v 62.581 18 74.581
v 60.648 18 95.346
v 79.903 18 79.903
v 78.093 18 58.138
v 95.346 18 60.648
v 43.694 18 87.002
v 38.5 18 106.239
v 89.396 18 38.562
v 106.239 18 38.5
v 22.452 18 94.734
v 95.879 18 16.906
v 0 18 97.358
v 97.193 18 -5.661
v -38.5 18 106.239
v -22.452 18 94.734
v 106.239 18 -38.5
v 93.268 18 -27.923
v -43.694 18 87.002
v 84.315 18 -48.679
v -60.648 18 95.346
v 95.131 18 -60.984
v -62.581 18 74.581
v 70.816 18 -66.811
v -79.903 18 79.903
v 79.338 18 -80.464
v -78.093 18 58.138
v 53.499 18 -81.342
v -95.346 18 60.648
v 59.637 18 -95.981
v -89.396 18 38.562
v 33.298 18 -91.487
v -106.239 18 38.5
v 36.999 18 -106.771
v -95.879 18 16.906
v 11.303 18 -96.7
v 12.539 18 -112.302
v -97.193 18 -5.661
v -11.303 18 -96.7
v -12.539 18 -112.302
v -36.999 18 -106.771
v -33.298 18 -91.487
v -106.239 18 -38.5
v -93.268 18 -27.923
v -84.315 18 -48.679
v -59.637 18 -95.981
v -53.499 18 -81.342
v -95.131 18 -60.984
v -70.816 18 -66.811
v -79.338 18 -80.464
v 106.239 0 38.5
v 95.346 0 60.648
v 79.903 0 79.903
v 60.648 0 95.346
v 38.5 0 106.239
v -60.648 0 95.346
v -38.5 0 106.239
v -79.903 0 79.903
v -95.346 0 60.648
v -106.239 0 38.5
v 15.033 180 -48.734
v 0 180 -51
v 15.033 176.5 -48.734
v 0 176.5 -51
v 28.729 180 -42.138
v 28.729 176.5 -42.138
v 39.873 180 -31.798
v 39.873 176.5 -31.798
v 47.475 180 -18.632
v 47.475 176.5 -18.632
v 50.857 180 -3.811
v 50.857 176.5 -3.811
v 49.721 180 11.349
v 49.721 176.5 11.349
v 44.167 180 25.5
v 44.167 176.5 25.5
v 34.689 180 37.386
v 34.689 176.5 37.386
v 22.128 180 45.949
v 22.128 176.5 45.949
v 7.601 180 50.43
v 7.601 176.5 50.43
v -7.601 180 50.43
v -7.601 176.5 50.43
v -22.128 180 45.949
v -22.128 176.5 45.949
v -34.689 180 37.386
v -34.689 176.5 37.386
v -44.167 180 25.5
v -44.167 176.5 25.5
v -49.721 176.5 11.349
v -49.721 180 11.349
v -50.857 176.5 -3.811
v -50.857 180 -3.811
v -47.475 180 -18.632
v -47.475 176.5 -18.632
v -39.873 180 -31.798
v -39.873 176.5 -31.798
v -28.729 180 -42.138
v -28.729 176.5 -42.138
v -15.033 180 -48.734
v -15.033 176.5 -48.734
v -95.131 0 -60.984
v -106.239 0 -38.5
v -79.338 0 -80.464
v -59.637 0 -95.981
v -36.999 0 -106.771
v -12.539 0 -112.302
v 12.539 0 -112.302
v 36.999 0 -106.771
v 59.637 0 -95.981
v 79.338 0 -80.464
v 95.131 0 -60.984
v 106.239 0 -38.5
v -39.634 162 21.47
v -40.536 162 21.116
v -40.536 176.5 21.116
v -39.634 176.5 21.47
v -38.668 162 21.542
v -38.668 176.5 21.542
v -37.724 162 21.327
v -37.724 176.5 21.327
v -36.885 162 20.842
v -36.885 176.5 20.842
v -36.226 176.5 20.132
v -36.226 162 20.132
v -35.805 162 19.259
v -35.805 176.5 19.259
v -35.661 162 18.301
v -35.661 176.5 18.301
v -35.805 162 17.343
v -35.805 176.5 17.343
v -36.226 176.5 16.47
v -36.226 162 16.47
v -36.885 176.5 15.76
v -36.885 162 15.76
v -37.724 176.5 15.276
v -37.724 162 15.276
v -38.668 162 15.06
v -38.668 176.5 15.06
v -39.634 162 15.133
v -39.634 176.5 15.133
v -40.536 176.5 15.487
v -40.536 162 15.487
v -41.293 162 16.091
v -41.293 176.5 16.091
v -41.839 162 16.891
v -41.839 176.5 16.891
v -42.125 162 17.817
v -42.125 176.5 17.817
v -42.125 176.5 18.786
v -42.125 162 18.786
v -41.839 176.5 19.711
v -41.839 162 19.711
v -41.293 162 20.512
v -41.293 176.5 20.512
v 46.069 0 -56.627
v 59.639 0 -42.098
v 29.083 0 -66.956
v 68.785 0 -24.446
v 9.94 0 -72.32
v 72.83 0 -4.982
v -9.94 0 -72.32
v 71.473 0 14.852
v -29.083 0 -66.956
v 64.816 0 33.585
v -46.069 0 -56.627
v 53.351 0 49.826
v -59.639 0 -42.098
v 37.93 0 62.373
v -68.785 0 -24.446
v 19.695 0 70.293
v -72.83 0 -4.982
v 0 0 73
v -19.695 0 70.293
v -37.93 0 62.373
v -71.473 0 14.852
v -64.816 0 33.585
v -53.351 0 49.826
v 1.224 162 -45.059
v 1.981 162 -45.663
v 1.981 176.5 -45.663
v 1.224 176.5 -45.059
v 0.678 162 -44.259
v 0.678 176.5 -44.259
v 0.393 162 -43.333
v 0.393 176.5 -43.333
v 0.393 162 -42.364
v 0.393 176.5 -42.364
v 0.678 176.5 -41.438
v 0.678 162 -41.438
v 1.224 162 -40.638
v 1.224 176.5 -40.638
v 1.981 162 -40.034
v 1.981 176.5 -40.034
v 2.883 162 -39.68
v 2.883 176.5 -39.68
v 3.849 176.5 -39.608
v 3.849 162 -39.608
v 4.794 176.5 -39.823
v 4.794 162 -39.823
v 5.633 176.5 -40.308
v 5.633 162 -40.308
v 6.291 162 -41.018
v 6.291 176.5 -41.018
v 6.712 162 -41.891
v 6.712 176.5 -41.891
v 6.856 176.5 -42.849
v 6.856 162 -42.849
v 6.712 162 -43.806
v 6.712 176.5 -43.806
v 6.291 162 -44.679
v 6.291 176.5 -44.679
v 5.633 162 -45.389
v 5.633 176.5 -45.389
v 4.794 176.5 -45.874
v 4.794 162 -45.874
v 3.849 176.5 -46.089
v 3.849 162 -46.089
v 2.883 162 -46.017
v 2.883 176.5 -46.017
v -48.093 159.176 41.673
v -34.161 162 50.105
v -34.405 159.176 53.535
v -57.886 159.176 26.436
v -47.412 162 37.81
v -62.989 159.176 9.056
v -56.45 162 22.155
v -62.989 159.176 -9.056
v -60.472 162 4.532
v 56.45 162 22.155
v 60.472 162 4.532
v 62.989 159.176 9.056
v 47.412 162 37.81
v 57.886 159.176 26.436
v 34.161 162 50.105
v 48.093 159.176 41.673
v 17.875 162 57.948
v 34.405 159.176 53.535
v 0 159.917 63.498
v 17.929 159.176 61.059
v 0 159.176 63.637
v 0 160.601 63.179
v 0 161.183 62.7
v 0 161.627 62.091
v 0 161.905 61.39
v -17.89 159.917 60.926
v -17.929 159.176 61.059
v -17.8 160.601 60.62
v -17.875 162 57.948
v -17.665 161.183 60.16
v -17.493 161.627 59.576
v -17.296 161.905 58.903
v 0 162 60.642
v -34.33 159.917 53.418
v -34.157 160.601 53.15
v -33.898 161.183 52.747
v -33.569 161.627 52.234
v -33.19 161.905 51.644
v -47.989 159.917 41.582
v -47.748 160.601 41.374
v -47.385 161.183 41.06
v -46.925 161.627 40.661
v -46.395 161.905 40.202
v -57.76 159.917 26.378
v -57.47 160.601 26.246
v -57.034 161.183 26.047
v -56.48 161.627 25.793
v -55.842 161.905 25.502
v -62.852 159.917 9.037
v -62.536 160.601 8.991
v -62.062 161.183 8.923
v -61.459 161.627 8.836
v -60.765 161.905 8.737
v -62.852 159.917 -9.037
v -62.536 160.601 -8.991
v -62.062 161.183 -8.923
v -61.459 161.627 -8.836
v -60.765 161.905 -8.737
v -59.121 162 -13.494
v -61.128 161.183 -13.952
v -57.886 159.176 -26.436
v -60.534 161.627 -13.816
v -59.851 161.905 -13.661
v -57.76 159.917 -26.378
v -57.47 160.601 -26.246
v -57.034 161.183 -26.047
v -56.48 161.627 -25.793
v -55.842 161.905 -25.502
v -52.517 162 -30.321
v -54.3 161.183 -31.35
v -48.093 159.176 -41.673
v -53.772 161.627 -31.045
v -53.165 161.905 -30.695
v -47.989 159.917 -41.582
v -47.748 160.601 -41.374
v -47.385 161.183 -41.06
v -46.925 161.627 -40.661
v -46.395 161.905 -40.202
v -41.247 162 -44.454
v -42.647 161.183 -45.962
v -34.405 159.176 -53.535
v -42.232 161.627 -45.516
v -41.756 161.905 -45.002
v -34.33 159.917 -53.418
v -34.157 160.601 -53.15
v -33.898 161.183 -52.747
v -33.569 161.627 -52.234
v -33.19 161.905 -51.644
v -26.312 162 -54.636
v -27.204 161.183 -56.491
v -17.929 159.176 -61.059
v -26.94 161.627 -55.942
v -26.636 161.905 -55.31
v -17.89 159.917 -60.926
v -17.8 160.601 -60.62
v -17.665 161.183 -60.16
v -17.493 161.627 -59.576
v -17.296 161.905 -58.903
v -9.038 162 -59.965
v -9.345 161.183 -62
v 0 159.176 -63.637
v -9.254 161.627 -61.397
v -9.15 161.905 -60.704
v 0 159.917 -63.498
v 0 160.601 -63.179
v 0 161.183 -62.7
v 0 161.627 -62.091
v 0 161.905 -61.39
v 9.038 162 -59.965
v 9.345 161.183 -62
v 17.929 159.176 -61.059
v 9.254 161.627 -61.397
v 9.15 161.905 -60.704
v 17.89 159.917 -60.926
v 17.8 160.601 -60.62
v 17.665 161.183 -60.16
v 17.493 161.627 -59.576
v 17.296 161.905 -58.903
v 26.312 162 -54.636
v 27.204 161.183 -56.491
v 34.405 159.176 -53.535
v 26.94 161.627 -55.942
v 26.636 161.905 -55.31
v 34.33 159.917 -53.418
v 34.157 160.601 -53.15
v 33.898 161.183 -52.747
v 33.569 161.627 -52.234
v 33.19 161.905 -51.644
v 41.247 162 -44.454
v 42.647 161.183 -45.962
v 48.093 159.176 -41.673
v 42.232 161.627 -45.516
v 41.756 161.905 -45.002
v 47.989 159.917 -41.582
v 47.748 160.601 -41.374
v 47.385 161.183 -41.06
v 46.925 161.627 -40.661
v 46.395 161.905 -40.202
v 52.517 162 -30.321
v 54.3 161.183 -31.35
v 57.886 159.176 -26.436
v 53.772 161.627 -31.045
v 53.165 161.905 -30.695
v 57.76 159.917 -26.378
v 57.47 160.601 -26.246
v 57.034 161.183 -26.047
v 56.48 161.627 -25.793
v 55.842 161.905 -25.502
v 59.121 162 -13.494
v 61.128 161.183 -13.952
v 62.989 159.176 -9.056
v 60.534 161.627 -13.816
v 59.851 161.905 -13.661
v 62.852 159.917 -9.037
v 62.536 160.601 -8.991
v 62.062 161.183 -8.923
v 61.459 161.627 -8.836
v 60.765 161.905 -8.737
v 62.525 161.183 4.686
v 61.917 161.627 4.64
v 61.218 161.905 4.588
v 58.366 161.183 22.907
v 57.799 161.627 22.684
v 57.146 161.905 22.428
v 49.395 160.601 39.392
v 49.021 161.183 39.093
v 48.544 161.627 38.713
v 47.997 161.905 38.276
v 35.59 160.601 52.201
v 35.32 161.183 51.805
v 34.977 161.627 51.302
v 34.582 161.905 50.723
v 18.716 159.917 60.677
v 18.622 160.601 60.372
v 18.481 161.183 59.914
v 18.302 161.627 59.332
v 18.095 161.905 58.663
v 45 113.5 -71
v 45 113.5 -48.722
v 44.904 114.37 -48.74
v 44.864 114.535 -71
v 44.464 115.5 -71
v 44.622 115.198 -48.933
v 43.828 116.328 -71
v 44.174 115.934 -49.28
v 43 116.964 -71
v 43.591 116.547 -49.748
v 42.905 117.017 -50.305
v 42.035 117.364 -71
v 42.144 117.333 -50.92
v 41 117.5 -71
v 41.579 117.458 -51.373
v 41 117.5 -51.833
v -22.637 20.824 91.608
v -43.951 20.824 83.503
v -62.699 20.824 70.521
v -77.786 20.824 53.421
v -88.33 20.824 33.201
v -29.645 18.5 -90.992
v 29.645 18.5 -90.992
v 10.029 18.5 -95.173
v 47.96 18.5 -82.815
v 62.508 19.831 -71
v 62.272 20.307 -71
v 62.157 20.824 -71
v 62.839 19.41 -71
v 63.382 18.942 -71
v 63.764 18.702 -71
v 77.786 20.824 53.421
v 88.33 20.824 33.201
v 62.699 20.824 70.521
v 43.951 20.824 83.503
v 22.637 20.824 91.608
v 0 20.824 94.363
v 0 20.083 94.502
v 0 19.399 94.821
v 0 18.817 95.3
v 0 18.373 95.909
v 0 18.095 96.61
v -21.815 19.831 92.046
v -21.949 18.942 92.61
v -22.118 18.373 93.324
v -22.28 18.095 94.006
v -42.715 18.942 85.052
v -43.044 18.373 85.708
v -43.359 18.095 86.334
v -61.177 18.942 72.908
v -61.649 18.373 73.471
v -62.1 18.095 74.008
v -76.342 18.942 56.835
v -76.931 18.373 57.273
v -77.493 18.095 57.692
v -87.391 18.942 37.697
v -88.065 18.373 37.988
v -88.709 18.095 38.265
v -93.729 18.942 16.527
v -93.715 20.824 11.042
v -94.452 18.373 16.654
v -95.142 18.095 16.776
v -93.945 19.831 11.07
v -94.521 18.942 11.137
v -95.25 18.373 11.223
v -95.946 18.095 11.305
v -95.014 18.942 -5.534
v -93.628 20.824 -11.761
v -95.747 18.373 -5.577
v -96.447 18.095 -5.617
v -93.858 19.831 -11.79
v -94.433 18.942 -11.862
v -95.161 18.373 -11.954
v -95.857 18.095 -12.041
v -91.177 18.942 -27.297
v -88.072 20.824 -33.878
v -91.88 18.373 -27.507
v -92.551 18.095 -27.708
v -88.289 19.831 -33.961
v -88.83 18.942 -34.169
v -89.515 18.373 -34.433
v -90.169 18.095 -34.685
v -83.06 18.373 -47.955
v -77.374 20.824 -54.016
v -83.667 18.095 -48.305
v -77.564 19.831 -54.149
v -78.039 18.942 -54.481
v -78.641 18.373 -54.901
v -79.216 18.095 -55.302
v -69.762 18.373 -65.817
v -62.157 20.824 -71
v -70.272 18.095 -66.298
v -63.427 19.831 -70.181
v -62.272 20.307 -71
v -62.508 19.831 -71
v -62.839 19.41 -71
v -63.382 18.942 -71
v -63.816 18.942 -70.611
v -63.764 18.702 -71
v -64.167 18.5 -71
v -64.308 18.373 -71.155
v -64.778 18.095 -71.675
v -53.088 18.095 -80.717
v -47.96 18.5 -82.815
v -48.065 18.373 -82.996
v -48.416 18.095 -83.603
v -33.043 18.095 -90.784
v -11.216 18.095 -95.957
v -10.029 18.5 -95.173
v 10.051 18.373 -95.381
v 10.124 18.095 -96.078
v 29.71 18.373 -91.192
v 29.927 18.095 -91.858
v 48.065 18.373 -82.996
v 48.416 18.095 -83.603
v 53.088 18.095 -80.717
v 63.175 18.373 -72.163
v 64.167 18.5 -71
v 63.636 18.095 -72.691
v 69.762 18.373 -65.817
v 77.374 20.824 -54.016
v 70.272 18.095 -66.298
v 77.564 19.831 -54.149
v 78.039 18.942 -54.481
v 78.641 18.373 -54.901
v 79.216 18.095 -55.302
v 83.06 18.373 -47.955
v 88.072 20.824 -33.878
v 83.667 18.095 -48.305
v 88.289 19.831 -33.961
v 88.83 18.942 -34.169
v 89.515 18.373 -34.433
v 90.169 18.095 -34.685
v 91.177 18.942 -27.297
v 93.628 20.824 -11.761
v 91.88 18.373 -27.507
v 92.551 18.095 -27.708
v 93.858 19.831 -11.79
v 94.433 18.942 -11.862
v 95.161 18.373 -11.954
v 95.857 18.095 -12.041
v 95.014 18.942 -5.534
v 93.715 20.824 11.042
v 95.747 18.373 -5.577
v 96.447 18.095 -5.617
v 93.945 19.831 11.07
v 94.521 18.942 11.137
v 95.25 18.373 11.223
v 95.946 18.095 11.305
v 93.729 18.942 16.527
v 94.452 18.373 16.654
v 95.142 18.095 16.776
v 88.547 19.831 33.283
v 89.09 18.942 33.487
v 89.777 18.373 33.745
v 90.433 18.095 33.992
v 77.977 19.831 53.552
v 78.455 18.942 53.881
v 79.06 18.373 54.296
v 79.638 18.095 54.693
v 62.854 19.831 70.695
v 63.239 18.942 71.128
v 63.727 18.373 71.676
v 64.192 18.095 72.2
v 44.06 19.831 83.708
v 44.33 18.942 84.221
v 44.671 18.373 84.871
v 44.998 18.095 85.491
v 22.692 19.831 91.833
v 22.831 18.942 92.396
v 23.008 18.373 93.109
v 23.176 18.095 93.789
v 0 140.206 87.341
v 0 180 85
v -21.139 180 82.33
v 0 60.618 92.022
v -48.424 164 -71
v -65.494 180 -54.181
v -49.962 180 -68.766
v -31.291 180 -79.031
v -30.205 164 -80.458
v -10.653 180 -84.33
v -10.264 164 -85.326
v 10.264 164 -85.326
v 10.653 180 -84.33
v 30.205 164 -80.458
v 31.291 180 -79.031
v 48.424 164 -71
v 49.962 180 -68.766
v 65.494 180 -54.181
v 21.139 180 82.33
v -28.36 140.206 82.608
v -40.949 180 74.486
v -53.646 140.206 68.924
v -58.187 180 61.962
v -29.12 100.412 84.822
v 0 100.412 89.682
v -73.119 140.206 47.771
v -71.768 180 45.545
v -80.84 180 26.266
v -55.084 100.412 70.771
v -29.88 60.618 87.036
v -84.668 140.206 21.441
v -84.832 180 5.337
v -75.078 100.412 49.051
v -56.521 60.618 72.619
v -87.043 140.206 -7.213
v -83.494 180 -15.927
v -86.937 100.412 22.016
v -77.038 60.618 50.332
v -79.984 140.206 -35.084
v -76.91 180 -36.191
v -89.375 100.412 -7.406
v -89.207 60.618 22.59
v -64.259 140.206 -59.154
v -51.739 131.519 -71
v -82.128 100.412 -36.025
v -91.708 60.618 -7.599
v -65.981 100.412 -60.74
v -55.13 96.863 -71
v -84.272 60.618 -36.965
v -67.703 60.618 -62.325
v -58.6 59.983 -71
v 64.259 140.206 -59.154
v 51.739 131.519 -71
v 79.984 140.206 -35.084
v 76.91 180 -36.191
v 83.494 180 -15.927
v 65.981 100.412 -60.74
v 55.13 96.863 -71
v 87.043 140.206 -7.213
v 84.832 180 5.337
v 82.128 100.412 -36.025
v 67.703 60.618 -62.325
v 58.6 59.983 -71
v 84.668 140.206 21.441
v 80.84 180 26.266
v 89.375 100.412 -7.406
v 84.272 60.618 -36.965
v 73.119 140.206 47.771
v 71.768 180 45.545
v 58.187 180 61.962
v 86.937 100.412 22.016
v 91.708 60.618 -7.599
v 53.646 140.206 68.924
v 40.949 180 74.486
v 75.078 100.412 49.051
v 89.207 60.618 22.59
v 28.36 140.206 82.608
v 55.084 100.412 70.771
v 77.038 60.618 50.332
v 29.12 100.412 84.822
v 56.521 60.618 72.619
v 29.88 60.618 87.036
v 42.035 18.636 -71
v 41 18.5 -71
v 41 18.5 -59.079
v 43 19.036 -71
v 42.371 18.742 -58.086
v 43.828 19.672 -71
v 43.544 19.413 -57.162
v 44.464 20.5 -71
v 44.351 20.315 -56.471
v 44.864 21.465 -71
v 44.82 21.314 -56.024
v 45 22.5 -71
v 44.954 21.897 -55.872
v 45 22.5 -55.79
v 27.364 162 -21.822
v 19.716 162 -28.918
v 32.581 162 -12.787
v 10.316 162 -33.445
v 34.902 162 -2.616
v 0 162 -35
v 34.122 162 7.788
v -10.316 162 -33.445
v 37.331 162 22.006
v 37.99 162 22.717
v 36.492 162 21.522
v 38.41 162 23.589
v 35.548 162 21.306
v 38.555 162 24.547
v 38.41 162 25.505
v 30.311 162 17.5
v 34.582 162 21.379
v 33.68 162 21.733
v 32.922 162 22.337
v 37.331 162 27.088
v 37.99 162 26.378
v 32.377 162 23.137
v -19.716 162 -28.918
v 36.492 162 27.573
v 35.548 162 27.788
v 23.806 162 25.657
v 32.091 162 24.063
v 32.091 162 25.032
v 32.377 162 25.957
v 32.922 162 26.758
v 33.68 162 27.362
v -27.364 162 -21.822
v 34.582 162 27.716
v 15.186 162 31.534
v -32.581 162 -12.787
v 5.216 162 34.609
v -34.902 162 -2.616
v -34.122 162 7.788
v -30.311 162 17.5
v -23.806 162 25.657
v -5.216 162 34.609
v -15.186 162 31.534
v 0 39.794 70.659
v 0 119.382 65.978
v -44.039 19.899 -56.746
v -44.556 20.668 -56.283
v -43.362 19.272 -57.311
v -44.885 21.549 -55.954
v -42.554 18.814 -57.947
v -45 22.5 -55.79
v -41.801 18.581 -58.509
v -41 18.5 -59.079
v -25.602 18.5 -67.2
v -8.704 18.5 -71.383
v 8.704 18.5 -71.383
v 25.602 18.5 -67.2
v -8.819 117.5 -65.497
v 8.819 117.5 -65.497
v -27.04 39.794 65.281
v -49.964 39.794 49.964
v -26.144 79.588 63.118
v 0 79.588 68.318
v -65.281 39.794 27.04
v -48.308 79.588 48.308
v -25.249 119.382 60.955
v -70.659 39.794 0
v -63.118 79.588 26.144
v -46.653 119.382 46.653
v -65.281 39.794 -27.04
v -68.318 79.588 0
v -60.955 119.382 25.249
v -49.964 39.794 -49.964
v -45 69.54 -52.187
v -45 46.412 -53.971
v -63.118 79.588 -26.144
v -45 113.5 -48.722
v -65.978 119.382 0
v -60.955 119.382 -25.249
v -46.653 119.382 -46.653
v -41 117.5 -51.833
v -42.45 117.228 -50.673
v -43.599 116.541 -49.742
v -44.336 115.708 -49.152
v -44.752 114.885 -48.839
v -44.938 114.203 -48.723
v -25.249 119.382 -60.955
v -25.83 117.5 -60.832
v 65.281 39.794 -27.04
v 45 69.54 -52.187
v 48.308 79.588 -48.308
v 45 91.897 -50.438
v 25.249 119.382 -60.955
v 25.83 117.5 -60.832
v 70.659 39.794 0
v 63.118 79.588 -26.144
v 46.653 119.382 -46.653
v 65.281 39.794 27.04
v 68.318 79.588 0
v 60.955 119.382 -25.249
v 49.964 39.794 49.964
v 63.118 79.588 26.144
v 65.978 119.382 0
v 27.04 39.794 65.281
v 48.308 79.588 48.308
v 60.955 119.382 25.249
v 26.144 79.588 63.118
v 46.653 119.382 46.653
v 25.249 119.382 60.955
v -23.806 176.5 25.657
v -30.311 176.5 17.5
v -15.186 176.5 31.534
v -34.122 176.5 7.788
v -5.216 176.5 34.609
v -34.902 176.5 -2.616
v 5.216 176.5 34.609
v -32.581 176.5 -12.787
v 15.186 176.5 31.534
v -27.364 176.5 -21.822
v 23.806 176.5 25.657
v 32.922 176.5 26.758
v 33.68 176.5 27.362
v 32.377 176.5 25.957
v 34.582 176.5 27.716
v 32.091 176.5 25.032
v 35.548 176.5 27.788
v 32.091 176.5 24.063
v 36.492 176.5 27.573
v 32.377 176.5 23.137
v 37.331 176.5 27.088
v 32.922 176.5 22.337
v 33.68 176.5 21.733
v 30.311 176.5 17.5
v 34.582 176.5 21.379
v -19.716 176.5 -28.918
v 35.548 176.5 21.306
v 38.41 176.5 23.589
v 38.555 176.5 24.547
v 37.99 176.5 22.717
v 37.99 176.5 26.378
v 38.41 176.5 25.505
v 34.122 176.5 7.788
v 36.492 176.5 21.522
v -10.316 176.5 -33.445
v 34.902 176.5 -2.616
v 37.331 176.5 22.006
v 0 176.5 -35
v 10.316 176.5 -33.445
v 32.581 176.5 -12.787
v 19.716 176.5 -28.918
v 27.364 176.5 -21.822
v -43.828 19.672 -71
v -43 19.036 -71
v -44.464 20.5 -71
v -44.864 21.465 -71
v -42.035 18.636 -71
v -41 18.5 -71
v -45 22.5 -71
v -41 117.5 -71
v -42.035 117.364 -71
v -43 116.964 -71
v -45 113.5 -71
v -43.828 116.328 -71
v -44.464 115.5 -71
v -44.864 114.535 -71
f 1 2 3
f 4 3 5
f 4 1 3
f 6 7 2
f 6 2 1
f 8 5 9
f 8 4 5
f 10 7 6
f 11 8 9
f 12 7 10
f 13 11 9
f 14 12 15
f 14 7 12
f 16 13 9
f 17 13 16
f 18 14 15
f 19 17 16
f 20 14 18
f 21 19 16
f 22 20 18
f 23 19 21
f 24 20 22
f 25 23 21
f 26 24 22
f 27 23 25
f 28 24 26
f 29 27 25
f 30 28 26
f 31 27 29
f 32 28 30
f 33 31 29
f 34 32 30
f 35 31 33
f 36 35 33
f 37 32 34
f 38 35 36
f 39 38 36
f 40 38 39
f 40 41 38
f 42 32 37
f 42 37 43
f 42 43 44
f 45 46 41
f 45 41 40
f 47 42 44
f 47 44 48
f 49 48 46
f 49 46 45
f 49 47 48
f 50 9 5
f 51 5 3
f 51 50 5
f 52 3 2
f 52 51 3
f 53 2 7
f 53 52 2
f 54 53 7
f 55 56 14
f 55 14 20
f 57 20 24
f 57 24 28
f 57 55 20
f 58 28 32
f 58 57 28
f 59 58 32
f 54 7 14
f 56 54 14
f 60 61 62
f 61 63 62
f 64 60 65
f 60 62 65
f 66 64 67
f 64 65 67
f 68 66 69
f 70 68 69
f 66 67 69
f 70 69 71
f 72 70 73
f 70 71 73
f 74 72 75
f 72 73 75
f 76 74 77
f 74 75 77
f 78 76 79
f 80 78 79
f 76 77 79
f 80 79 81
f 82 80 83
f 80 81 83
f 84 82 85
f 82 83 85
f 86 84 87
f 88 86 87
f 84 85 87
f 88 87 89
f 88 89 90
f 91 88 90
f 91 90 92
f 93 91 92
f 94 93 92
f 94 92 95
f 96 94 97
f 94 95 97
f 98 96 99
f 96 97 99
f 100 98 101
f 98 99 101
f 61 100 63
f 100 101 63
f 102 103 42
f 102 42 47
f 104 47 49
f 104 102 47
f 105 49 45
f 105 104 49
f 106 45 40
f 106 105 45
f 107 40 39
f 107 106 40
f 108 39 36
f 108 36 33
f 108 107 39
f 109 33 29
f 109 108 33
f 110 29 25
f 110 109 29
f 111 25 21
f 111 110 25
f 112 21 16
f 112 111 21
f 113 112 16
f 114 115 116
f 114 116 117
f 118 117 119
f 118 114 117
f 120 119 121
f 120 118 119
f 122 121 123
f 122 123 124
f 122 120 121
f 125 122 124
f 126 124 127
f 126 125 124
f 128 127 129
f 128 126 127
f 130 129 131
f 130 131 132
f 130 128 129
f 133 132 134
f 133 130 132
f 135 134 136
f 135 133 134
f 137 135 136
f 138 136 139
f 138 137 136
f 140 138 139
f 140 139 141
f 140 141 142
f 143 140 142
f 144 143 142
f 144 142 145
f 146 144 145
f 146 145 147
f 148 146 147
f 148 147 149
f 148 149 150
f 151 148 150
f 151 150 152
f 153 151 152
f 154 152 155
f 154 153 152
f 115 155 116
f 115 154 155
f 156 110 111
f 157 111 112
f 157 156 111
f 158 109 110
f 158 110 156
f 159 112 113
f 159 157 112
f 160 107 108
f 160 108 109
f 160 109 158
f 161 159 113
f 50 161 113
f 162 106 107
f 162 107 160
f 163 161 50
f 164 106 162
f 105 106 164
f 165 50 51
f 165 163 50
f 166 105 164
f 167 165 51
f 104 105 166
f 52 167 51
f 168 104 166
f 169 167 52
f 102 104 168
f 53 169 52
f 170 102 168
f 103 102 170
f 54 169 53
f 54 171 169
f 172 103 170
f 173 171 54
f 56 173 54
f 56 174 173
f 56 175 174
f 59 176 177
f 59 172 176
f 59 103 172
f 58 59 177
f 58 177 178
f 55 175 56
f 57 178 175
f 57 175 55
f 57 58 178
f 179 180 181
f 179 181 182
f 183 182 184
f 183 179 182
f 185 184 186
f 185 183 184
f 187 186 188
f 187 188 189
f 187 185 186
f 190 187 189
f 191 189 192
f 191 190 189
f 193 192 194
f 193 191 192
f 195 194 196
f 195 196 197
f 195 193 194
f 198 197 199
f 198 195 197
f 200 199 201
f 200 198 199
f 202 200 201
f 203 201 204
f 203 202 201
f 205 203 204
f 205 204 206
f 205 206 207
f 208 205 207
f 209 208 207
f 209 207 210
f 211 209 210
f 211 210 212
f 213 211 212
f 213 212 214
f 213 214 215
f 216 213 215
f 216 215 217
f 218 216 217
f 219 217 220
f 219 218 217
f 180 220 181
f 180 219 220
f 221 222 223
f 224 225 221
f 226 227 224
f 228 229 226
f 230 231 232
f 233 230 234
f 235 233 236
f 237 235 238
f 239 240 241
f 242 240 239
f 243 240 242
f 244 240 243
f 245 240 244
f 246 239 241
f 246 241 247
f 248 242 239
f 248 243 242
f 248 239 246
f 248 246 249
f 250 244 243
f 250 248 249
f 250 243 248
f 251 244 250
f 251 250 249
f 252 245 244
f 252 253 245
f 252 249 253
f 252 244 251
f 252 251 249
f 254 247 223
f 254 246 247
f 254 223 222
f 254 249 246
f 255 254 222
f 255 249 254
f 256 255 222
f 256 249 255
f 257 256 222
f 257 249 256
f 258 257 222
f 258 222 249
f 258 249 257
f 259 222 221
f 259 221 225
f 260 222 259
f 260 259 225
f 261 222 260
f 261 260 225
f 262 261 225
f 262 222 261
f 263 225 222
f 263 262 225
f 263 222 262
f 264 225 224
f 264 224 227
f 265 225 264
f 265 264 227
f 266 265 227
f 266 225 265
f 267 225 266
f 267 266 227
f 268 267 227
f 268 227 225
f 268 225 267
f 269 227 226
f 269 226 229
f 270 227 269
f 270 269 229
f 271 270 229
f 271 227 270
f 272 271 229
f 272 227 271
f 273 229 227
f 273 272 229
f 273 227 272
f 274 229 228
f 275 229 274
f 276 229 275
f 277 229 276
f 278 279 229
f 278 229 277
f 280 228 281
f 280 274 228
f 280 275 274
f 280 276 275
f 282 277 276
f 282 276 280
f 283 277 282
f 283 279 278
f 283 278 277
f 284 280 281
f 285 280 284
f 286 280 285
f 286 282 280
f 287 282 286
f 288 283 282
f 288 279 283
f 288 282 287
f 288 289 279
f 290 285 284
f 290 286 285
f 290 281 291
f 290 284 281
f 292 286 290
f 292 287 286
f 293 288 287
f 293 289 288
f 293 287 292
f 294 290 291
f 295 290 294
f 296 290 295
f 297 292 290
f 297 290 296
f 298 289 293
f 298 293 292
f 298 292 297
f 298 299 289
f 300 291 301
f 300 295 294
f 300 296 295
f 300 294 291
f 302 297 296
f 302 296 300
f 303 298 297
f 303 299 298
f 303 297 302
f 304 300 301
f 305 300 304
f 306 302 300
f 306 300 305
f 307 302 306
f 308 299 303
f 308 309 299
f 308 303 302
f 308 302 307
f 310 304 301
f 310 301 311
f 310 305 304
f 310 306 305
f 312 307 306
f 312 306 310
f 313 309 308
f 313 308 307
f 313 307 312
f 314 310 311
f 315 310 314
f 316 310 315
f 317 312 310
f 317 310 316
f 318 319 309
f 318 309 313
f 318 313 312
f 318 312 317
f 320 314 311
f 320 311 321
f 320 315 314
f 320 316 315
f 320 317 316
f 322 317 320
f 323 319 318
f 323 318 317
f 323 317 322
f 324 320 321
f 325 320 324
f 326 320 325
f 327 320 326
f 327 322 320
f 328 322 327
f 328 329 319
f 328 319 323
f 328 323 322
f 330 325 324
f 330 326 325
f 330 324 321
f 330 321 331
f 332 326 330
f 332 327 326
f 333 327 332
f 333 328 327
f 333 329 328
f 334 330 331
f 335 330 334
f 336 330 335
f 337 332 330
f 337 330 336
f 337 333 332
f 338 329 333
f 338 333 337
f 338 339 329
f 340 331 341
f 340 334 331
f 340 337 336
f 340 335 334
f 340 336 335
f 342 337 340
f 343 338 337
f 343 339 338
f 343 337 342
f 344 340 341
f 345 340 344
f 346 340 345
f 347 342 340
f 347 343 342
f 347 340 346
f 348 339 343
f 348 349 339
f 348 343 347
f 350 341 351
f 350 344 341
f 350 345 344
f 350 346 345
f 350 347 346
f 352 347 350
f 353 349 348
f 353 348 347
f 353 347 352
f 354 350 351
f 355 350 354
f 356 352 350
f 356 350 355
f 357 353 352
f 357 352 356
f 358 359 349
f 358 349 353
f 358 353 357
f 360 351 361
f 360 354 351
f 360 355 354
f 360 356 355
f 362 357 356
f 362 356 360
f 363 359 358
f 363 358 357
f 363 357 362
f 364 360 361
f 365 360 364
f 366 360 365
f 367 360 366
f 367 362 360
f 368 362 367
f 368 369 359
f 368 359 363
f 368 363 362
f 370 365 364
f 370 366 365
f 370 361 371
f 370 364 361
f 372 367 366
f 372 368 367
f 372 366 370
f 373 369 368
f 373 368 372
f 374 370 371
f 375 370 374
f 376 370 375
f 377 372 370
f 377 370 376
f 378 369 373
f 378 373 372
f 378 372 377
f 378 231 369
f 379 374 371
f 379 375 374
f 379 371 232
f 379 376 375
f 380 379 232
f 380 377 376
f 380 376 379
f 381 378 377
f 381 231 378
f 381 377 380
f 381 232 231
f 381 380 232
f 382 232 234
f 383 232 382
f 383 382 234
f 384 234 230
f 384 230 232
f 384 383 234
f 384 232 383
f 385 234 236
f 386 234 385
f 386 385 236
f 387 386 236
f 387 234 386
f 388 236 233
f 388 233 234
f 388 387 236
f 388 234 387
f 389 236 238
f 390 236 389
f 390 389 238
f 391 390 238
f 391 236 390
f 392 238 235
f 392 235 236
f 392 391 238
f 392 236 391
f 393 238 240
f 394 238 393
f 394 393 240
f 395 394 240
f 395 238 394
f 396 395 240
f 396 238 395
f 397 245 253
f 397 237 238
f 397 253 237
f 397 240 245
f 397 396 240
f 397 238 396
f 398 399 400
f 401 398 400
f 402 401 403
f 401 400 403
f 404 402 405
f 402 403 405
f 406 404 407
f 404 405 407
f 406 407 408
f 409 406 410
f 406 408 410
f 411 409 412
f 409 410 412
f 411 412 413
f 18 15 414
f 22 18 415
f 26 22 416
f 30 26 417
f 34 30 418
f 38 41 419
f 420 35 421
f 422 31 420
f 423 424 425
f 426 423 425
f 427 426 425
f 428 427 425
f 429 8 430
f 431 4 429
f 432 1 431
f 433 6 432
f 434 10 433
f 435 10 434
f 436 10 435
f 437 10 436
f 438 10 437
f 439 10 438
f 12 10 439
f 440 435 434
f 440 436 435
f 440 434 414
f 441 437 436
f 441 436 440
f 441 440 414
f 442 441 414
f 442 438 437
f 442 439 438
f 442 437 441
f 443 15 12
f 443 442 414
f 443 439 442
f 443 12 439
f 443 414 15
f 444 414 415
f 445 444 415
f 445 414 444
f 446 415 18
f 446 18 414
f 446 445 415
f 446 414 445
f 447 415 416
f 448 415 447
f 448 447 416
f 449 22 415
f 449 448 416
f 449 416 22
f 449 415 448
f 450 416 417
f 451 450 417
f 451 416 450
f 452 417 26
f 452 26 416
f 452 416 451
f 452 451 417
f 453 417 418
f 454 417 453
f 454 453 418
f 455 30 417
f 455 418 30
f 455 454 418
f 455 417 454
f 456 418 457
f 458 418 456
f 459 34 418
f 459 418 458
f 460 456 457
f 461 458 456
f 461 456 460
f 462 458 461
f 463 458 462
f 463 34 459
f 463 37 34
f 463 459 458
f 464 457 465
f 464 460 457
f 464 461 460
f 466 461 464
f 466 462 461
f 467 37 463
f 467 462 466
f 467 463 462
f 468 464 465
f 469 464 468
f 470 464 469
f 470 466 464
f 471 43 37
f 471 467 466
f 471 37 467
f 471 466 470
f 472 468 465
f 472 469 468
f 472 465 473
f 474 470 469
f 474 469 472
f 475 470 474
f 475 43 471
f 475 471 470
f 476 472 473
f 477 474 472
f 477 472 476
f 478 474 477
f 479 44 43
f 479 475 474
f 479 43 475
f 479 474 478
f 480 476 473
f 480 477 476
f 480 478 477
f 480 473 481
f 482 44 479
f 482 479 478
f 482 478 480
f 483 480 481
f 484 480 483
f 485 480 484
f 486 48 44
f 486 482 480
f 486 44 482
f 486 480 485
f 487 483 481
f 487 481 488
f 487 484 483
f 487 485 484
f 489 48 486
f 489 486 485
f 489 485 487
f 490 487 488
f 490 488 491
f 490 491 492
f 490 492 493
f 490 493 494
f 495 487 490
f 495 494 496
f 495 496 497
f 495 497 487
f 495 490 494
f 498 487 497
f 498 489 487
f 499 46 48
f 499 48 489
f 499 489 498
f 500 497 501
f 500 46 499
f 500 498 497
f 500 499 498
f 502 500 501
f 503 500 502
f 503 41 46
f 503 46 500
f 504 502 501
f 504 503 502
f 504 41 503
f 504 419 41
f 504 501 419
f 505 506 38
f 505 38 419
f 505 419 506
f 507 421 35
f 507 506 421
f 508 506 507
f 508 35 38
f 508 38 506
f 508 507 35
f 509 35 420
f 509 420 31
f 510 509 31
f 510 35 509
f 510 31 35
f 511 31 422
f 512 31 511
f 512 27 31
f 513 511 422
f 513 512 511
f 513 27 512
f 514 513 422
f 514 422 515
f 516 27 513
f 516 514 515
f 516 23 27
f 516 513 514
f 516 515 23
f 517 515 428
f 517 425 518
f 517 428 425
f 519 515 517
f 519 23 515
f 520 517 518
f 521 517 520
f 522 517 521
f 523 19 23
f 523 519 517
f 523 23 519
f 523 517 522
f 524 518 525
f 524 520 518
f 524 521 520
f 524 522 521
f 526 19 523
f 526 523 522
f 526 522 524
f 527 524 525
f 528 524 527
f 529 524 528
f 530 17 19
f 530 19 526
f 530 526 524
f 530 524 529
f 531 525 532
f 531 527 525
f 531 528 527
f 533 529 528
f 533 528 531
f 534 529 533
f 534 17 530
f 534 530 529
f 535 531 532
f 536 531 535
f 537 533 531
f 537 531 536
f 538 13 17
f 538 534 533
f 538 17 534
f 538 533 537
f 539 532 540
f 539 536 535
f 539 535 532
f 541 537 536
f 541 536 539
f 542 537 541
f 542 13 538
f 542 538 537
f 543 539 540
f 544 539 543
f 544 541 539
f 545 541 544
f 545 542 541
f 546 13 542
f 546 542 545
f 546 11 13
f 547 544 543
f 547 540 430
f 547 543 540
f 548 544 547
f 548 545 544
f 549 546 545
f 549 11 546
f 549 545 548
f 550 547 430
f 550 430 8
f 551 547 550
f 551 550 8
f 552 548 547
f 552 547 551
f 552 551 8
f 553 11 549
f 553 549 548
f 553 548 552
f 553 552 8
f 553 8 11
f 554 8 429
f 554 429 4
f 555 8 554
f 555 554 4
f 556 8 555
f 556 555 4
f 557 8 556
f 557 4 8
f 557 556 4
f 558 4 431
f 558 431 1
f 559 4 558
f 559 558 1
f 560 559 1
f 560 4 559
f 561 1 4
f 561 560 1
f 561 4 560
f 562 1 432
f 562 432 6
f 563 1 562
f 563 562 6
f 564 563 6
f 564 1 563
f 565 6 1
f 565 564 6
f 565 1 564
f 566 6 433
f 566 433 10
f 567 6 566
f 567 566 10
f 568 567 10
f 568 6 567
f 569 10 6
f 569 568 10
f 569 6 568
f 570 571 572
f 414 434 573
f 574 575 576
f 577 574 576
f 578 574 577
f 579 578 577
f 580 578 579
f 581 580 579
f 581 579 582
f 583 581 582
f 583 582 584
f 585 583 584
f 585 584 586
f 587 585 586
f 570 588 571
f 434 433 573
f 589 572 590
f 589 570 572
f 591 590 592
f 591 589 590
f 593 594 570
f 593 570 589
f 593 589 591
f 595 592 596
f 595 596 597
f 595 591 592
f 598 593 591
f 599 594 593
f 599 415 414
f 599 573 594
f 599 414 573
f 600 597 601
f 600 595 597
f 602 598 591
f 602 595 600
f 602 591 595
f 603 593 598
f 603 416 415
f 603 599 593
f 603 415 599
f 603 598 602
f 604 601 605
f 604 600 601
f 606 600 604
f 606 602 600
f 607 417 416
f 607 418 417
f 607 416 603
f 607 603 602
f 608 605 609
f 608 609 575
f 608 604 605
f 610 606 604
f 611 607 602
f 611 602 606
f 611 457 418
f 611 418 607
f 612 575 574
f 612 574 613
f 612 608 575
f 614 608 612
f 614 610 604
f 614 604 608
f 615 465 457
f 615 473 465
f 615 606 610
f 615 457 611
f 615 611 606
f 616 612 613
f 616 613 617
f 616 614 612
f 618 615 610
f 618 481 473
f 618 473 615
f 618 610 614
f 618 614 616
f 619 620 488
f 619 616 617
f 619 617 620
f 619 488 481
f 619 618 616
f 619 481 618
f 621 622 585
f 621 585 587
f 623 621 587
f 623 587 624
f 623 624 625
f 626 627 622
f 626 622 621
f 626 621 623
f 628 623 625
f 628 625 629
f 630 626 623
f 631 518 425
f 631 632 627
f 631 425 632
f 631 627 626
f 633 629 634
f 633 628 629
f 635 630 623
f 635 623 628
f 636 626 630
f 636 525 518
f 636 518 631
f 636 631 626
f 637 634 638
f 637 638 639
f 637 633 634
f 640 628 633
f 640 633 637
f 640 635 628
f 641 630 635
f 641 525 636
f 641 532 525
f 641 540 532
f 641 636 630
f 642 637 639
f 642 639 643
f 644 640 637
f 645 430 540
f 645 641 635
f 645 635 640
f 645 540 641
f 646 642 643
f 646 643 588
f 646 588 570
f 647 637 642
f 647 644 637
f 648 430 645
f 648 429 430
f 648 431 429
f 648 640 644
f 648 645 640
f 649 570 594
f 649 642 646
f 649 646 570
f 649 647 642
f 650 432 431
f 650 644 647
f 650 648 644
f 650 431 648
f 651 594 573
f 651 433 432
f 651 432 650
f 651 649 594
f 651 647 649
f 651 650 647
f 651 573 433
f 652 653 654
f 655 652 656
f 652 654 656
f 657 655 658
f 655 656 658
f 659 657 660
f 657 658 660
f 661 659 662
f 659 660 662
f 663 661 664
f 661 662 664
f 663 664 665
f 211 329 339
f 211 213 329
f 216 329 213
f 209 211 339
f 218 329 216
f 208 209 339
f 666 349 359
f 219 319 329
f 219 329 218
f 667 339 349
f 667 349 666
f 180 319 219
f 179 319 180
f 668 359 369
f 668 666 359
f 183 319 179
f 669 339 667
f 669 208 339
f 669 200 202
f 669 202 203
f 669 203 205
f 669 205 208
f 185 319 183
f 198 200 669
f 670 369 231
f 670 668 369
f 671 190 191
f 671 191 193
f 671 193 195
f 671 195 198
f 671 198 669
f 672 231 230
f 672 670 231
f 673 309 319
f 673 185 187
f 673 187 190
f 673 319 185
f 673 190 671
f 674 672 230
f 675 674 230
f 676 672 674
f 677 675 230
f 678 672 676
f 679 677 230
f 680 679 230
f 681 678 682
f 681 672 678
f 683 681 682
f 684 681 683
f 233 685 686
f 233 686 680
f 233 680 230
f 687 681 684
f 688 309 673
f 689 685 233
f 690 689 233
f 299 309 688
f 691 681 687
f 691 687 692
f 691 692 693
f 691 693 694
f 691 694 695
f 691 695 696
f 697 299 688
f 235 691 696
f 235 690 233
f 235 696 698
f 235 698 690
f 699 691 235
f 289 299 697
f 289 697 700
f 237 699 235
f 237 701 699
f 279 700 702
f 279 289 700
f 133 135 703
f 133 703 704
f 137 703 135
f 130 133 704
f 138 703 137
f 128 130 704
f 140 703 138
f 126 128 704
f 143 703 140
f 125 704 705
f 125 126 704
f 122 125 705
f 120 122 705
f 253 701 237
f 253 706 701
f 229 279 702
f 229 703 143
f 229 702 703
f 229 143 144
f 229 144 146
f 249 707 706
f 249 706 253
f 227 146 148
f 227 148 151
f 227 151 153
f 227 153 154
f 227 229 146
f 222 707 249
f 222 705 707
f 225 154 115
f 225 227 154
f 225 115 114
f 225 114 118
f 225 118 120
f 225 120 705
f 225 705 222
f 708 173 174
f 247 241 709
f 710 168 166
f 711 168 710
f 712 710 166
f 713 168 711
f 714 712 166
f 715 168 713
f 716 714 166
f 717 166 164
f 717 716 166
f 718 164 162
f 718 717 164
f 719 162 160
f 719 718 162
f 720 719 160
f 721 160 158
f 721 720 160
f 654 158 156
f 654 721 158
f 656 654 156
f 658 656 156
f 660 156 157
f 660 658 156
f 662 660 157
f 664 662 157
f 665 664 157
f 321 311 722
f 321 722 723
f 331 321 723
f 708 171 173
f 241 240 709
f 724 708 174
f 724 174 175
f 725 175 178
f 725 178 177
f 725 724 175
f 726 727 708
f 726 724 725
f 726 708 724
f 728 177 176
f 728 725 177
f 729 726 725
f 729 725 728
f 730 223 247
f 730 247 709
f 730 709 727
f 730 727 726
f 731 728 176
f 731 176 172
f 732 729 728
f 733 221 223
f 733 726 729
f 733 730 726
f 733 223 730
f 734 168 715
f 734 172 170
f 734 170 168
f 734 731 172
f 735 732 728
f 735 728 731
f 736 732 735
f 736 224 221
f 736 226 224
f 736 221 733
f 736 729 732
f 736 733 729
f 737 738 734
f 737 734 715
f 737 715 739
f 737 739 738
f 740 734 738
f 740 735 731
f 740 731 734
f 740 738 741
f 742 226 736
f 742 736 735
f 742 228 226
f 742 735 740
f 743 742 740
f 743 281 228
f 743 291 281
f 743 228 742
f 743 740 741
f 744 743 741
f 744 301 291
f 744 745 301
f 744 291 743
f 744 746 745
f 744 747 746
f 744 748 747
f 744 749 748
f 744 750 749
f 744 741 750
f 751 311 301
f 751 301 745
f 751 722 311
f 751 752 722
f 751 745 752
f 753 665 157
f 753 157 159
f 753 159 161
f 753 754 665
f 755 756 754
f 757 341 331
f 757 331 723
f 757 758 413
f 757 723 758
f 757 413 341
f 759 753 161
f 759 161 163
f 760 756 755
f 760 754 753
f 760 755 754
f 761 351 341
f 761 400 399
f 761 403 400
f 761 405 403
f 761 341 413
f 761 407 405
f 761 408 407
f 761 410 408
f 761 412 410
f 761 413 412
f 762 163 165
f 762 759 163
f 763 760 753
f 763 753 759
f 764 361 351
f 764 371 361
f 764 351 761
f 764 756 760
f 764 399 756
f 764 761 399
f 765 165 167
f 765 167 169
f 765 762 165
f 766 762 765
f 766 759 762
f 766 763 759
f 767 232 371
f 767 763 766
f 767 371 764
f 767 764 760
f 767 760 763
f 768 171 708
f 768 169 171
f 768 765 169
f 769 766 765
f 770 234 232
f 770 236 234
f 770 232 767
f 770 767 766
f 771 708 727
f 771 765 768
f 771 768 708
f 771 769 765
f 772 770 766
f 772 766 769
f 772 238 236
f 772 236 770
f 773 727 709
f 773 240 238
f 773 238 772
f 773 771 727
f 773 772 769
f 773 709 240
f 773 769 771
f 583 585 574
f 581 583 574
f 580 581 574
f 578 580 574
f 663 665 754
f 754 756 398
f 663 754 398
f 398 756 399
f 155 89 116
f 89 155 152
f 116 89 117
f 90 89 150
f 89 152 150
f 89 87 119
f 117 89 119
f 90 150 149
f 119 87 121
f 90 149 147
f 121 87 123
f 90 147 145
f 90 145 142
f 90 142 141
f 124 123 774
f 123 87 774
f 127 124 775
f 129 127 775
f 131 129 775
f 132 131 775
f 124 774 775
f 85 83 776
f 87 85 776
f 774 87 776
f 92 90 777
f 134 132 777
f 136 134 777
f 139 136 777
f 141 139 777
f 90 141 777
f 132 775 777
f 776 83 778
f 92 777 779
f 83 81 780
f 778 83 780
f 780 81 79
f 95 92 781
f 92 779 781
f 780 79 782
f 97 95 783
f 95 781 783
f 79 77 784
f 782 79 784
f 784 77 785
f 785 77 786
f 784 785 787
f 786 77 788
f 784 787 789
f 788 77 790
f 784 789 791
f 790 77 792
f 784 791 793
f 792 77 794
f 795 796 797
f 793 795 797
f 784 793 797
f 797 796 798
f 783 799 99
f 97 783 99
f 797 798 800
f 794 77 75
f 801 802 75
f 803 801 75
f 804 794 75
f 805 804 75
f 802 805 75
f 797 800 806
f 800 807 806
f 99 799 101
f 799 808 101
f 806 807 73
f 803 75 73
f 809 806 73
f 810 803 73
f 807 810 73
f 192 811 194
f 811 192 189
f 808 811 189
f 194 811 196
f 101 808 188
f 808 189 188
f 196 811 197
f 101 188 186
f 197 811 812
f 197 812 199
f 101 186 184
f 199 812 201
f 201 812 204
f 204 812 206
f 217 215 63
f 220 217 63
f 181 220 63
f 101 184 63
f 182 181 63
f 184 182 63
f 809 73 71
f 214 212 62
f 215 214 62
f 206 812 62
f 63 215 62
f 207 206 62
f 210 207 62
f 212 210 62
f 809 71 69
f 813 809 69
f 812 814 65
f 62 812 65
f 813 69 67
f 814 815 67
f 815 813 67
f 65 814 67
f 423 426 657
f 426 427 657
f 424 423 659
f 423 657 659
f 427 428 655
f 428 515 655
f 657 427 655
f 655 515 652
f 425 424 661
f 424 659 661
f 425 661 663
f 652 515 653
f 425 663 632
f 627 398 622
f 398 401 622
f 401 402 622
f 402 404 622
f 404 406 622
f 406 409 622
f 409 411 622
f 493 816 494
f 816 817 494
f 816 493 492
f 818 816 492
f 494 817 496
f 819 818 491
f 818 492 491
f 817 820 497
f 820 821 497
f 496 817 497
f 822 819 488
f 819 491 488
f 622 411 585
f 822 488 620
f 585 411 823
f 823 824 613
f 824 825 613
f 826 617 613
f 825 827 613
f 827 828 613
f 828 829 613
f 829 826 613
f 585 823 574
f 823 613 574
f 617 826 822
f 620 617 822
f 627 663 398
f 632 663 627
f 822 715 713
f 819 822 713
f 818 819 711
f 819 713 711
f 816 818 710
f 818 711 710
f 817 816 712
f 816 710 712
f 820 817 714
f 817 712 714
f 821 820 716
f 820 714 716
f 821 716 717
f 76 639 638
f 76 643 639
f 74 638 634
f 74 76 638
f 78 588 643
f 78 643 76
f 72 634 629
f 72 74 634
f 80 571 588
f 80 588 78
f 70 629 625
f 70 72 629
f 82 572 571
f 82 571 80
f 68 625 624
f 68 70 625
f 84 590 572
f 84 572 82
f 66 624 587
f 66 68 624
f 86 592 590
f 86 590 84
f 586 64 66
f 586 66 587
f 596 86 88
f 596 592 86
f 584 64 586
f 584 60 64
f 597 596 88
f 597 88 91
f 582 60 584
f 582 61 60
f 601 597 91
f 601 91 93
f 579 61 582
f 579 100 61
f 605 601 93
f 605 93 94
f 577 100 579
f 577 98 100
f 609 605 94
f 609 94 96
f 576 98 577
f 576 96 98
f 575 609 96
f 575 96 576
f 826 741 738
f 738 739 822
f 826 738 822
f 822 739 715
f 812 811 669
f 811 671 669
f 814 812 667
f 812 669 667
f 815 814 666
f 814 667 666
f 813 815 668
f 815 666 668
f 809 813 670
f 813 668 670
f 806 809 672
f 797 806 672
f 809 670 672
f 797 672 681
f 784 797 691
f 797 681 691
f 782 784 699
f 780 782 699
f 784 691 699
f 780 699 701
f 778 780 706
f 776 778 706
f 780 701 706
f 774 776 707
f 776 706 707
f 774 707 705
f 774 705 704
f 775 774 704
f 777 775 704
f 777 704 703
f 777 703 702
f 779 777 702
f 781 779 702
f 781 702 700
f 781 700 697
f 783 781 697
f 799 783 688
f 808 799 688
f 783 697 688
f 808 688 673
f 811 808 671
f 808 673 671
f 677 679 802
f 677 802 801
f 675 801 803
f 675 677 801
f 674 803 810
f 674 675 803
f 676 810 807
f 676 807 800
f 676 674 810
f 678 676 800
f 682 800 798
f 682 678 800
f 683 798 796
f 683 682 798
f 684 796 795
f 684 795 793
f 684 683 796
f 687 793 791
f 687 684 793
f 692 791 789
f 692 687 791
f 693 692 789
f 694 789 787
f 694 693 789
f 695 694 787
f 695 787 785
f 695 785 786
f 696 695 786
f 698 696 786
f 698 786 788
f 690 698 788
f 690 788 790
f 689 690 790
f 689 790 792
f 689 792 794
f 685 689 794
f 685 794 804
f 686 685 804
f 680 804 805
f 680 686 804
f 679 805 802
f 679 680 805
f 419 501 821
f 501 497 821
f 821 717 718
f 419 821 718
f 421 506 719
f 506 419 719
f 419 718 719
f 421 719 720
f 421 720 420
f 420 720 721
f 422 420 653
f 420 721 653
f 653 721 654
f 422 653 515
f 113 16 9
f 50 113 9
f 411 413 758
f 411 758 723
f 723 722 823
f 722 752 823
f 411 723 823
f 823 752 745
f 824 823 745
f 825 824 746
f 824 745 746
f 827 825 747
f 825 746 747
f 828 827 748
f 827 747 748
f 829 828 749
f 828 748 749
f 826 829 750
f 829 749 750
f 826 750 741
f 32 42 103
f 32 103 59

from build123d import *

# Parameters (mm, degrees)
CONG_1_R                     = 3
ESQUISSE2_W                  = 28.843575133
ESQUISSE2_H                  = 77
ESQUISSE2_W_2                = 77
ESQUISSE2_H_2                = 28.843575133
ENL_V_MAT_EXTRU_2_DEPTH      = 228.556586369
ENL_V_MAT_EXTRU_3_DEPTH      = 238.604187674
ENL_V_MAT_EXTRU_4_DEPTH      = 238.604187749
ENL_V_MAT_EXTRU_4_DEPTH_BACK = 238.604187749
ESQUISSE10_W                 = 22.430726153
ESQUISSE10_H                 = 145.5
PER_AGE1_START               = 162
PER_AGE1_OUTLINE_R           = 3.25
PER_AGE1_DEPTH               = 14.5
R_P_TITION_CIRCULAIRE1_COUNT = 3


# Read off the part's stored shape, not the designer's step: Perçage1
with BuildPart() as part:
    # Esquisse1 → Révolution1 (revolve)
    with BuildSketch(Plane.XY, mode=Mode.PRIVATE) as r_volution1_sk:
        Polygon((-113, 0), (-73, 0), (-63.470588237, 162), (0, 162), (0, 180), (-85, 180), (-94.529411763, 18), (-113, 18), align=None)
    revolve(r_volution1_sk.sketch.rotate(Axis((0, 193.73208918, 0), (0, -1, 0)), 270), axis=Axis((0, 193.73208918, 0), (0, -1, 0)))

    # Congé1
    cong_1_edges = [part.edges().sort_by_distance(p)[0] for p in [
        (0, 162, -63.470588237),
        (0, 18, -94.529411763),
    ]]
    fillet(cong_1_edges, radius=CONG_1_R)

    # Esquisse2 → Enlèv. mat.-Extru.2 (cut, through all)
    with BuildSketch(Plane(origin=(0, 18, 0), x_dir=(-1, 0, 0), z_dir=(0, 1, 0))):
        with Locations((120.660904657, 0)):
            Rectangle(ESQUISSE2_W, ESQUISSE2_H)
        with Locations((0, 120.660904657)):
            Rectangle(ESQUISSE2_W_2, ESQUISSE2_H_2)
        with Locations((-120.660904657, 0)):
            Rectangle(ESQUISSE2_W, ESQUISSE2_H)
    extrude(amount=-ENL_V_MAT_EXTRU_2_DEPTH, mode=Mode.SUBTRACT)

    # Esquisse5 → Enlèvement de matière-Révolution1 (revolve, cut)
    with BuildSketch(Plane.XY, mode=Mode.PRIVATE) as enl_vement_de_mati_re_r_volution1_sk:
        Polygon((-51, 180), (-51, 176.5), (-35, 176.5), (-35, 162), (0, 162), (0, 180), align=None)
    revolve(enl_vement_de_mati_re_r_volution1_sk.sketch.rotate(Axis((0, 197.596638655, 0), (0, -1, 0)), 90), axis=Axis((0, 197.596638655, 0), (0, -1, 0)), mode=Mode.SUBTRACT)

    # Esquisse9 → Enlèv. mat.-Extru.3 (cut, through all)
    with BuildSketch(Plane.XY):
        with BuildLine():
            Line((41, 117.5), (-41, 117.5))
            ThreePointArc((-41, 117.5), (-43.828427125, 116.328427125), (-45, 113.5))
            Line((-45, 113.5), (-45, 22.5))
            ThreePointArc((-45, 22.5), (-43.828427125, 19.671572875), (-41, 18.5))
            Line((-41, 18.5), (41, 18.5))
            ThreePointArc((41, 18.5), (43.828427125, 19.671572875), (45, 22.5))
            Line((45, 22.5), (45, 113.5))
            ThreePointArc((45, 113.5), (43.828427125, 116.328427125), (41, 117.5))
        make_face()
    extrude(amount=-ENL_V_MAT_EXTRU_3_DEPTH, mode=Mode.SUBTRACT)

    # Esquisse10 → Enlèv. mat.-Extru.4 (cut, two sides: drawn at the far end of the back side and taken through both)
    with BuildSketch(Plane(origin=(0, 0, 0), x_dir=(0, 0, -1), z_dir=(1, 0, 0)).offset(-ENL_V_MAT_EXTRU_4_DEPTH_BACK)):
        with Locations((82.215363077, 91.25)):
            Rectangle(ESQUISSE10_W, ESQUISSE10_H)
    extrude(amount=ENL_V_MAT_EXTRU_4_DEPTH + ENL_V_MAT_EXTRU_4_DEPTH_BACK, mode=Mode.SUBTRACT)

    # Perçage1 outline → Perçage1 (cut)
    with BuildSketch(Plane(origin=(0, 0, 0), x_dir=(1, 0, 0), z_dir=(0, 1, 0)).offset(PER_AGE1_START)):
        with Locations((35.304789832, -24.547338245)):
            Circle(PER_AGE1_OUTLINE_R)
    per_age1 = extrude(amount=PER_AGE1_DEPTH, mode=Mode.SUBTRACT)

    # Répétition circulaire1: Perçage1 ×3 about axis
    r_p_tition_circulaire1_axis = Axis((0, 0, 0), (0, 1, 0))
    for i in range(1, R_P_TITION_CIRCULAIRE1_COUNT):
        add(per_age1.rotate(r_p_tition_circulaire1_axis, i * 360 / R_P_TITION_CIRCULAIRE1_COUNT), mode=Mode.SUBTRACT)


solid = part.part
